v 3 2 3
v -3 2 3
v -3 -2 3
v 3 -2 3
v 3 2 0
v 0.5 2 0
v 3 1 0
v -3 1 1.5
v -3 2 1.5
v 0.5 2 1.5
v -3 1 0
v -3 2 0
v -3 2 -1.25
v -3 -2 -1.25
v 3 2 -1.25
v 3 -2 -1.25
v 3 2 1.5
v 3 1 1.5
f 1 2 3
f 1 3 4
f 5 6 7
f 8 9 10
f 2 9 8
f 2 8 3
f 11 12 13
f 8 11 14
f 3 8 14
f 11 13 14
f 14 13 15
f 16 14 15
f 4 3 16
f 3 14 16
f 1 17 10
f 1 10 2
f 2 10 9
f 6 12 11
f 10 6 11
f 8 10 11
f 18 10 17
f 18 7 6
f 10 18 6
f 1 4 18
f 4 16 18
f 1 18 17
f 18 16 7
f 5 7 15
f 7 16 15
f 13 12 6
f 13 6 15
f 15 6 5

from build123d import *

# Parameters (mm, degrees)
SKETCH1_W           = 6
SKETCH1_H           = 4
BOSS_EXTRUDE1_DEPTH = 1.25
BOSS_EXTRUDE2_DEPTH = 1.5
BOSS_EXTRUDE3_START = 1.5
BOSS_EXTRUDE3_DEPTH = 1.5


with BuildPart() as part:
    # Sketch1 → Boss-Extrude1 (new body)
    with BuildSketch(Plane.XY):
        Rectangle(SKETCH1_W, SKETCH1_H)
    extrude(amount=-BOSS_EXTRUDE1_DEPTH)

    # Sketch1<3> → Boss-Extrude2 (add)
    with BuildSketch(Plane.XY):
        Polygon((0.5, 2), (-3, 1), (-3, -2), (3, -2), (3, 1), align=None)
    extrude(amount=BOSS_EXTRUDE2_DEPTH)

    # Sketch1<4> → Boss-Extrude3 (add)
    with BuildSketch(Plane.XY.offset(BOSS_EXTRUDE3_START)):
        Polygon((-3, 2), (-3, 1), (0.5, 2), align=None)
        Polygon((0.5, 2), (-3, 1), (-3, -2), (3, -2), (3, 1), align=None)
        Polygon((3, 2), (0.5, 2), (3, 1), align=None)
    extrude(amount=BOSS_EXTRUDE3_DEPTH)


solid = part.part
